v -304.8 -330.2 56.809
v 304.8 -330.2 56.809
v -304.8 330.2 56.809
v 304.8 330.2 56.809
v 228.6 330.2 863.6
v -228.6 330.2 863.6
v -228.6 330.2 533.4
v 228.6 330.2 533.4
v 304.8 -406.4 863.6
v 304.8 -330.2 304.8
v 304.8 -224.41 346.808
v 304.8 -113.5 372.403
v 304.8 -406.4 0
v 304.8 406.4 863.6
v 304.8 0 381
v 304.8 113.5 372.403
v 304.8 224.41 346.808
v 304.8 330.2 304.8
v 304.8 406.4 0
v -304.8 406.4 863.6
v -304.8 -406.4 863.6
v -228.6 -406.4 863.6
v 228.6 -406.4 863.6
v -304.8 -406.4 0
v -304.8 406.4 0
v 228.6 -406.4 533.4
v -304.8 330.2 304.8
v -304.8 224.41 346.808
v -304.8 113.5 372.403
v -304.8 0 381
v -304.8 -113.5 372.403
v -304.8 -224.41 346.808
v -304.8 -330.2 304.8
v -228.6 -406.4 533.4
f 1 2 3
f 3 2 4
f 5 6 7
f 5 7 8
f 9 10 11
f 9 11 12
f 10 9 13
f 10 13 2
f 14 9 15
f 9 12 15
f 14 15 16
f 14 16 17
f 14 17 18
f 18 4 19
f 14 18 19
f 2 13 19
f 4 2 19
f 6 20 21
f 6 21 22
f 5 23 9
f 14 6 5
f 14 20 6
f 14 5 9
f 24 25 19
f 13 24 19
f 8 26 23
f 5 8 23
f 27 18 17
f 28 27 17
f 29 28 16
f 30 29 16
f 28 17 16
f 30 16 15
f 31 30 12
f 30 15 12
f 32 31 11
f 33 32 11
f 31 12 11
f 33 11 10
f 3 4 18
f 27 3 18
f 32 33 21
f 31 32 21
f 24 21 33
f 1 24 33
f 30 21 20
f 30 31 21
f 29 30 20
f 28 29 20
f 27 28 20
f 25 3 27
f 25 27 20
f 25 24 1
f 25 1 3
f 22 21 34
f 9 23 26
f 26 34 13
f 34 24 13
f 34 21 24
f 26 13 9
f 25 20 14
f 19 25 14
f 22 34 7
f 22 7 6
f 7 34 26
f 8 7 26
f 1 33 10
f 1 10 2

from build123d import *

# Parameters (mm, degrees)
F0_W     = 609.6
F0_H     = 812.8
F1_DEPTH = 914.4
F4_DEPTH = 609.601
F3_W     = 457.2
F3_H     = 330.2
F5_DEPTH = 736.6
F6_DEPTH = 50.8


with BuildPart() as f1:
    # F0 (on Top) → F1 (new body)
    with BuildSketch(Plane.XY):
        Rectangle(F0_W, F0_H)
    extrude(amount=F1_DEPTH)

    # F2 (on face) → F4 (cut, through all)
    with BuildSketch(Plane.YZ.offset(304.8)):
        with BuildLine():
            Line((330.2, 56.8088516593), (330.2, 304.8))
            ThreePointArc((330.2, 304.8), (0, 381), (-330.2, 304.8))
            Line((-330.2, 304.8), (-330.2, 56.8088516593))
            Line((-330.2, 56.8088516593), (330.2, 56.8088516593))
        make_face()
    extrude(amount=-F4_DEPTH, mode=Mode.SUBTRACT)

    # F3 (on face) → F5 (cut)
    with BuildSketch(Plane.XZ.offset(406.4)):
        with Locations((0, 698.5)):
            Rectangle(F3_W, F3_H)
    extrude(amount=-F5_DEPTH, mode=Mode.SUBTRACT)

    # F6 (cut): a face of the model
    f6_faces = [f1.faces().sort_by_distance(p)[0] for p in [
        (0, 0, 914.4),
    ]]
    extrude(f6_faces, amount=-F6_DEPTH, mode=Mode.SUBTRACT)


solid = f1.part
